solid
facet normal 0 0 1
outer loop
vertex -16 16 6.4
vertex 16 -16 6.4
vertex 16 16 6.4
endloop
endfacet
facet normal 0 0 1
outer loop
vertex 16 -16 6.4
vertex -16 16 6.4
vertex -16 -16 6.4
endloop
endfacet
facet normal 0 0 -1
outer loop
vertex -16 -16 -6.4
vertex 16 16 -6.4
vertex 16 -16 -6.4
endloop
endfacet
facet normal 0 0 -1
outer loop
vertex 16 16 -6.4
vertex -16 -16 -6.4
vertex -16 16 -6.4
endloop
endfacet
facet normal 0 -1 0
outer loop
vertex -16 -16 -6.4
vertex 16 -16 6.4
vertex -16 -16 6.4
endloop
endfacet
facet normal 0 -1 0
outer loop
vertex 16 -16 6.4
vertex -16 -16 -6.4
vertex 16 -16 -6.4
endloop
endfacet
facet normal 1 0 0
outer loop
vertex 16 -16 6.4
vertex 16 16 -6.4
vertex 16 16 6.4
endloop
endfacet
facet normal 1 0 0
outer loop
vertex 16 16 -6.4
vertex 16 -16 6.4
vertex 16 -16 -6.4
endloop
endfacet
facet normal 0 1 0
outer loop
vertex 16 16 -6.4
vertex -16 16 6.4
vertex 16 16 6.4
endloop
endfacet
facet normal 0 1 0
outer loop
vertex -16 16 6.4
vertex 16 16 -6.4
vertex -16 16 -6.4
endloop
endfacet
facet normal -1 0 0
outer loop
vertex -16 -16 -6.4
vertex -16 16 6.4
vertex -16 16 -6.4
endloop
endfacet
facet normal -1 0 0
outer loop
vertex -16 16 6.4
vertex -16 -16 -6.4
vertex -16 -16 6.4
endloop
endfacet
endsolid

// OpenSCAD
size = 32;//block=32 //item=8



cube([size * 1, size * 1, size * 0.4], center = true);
